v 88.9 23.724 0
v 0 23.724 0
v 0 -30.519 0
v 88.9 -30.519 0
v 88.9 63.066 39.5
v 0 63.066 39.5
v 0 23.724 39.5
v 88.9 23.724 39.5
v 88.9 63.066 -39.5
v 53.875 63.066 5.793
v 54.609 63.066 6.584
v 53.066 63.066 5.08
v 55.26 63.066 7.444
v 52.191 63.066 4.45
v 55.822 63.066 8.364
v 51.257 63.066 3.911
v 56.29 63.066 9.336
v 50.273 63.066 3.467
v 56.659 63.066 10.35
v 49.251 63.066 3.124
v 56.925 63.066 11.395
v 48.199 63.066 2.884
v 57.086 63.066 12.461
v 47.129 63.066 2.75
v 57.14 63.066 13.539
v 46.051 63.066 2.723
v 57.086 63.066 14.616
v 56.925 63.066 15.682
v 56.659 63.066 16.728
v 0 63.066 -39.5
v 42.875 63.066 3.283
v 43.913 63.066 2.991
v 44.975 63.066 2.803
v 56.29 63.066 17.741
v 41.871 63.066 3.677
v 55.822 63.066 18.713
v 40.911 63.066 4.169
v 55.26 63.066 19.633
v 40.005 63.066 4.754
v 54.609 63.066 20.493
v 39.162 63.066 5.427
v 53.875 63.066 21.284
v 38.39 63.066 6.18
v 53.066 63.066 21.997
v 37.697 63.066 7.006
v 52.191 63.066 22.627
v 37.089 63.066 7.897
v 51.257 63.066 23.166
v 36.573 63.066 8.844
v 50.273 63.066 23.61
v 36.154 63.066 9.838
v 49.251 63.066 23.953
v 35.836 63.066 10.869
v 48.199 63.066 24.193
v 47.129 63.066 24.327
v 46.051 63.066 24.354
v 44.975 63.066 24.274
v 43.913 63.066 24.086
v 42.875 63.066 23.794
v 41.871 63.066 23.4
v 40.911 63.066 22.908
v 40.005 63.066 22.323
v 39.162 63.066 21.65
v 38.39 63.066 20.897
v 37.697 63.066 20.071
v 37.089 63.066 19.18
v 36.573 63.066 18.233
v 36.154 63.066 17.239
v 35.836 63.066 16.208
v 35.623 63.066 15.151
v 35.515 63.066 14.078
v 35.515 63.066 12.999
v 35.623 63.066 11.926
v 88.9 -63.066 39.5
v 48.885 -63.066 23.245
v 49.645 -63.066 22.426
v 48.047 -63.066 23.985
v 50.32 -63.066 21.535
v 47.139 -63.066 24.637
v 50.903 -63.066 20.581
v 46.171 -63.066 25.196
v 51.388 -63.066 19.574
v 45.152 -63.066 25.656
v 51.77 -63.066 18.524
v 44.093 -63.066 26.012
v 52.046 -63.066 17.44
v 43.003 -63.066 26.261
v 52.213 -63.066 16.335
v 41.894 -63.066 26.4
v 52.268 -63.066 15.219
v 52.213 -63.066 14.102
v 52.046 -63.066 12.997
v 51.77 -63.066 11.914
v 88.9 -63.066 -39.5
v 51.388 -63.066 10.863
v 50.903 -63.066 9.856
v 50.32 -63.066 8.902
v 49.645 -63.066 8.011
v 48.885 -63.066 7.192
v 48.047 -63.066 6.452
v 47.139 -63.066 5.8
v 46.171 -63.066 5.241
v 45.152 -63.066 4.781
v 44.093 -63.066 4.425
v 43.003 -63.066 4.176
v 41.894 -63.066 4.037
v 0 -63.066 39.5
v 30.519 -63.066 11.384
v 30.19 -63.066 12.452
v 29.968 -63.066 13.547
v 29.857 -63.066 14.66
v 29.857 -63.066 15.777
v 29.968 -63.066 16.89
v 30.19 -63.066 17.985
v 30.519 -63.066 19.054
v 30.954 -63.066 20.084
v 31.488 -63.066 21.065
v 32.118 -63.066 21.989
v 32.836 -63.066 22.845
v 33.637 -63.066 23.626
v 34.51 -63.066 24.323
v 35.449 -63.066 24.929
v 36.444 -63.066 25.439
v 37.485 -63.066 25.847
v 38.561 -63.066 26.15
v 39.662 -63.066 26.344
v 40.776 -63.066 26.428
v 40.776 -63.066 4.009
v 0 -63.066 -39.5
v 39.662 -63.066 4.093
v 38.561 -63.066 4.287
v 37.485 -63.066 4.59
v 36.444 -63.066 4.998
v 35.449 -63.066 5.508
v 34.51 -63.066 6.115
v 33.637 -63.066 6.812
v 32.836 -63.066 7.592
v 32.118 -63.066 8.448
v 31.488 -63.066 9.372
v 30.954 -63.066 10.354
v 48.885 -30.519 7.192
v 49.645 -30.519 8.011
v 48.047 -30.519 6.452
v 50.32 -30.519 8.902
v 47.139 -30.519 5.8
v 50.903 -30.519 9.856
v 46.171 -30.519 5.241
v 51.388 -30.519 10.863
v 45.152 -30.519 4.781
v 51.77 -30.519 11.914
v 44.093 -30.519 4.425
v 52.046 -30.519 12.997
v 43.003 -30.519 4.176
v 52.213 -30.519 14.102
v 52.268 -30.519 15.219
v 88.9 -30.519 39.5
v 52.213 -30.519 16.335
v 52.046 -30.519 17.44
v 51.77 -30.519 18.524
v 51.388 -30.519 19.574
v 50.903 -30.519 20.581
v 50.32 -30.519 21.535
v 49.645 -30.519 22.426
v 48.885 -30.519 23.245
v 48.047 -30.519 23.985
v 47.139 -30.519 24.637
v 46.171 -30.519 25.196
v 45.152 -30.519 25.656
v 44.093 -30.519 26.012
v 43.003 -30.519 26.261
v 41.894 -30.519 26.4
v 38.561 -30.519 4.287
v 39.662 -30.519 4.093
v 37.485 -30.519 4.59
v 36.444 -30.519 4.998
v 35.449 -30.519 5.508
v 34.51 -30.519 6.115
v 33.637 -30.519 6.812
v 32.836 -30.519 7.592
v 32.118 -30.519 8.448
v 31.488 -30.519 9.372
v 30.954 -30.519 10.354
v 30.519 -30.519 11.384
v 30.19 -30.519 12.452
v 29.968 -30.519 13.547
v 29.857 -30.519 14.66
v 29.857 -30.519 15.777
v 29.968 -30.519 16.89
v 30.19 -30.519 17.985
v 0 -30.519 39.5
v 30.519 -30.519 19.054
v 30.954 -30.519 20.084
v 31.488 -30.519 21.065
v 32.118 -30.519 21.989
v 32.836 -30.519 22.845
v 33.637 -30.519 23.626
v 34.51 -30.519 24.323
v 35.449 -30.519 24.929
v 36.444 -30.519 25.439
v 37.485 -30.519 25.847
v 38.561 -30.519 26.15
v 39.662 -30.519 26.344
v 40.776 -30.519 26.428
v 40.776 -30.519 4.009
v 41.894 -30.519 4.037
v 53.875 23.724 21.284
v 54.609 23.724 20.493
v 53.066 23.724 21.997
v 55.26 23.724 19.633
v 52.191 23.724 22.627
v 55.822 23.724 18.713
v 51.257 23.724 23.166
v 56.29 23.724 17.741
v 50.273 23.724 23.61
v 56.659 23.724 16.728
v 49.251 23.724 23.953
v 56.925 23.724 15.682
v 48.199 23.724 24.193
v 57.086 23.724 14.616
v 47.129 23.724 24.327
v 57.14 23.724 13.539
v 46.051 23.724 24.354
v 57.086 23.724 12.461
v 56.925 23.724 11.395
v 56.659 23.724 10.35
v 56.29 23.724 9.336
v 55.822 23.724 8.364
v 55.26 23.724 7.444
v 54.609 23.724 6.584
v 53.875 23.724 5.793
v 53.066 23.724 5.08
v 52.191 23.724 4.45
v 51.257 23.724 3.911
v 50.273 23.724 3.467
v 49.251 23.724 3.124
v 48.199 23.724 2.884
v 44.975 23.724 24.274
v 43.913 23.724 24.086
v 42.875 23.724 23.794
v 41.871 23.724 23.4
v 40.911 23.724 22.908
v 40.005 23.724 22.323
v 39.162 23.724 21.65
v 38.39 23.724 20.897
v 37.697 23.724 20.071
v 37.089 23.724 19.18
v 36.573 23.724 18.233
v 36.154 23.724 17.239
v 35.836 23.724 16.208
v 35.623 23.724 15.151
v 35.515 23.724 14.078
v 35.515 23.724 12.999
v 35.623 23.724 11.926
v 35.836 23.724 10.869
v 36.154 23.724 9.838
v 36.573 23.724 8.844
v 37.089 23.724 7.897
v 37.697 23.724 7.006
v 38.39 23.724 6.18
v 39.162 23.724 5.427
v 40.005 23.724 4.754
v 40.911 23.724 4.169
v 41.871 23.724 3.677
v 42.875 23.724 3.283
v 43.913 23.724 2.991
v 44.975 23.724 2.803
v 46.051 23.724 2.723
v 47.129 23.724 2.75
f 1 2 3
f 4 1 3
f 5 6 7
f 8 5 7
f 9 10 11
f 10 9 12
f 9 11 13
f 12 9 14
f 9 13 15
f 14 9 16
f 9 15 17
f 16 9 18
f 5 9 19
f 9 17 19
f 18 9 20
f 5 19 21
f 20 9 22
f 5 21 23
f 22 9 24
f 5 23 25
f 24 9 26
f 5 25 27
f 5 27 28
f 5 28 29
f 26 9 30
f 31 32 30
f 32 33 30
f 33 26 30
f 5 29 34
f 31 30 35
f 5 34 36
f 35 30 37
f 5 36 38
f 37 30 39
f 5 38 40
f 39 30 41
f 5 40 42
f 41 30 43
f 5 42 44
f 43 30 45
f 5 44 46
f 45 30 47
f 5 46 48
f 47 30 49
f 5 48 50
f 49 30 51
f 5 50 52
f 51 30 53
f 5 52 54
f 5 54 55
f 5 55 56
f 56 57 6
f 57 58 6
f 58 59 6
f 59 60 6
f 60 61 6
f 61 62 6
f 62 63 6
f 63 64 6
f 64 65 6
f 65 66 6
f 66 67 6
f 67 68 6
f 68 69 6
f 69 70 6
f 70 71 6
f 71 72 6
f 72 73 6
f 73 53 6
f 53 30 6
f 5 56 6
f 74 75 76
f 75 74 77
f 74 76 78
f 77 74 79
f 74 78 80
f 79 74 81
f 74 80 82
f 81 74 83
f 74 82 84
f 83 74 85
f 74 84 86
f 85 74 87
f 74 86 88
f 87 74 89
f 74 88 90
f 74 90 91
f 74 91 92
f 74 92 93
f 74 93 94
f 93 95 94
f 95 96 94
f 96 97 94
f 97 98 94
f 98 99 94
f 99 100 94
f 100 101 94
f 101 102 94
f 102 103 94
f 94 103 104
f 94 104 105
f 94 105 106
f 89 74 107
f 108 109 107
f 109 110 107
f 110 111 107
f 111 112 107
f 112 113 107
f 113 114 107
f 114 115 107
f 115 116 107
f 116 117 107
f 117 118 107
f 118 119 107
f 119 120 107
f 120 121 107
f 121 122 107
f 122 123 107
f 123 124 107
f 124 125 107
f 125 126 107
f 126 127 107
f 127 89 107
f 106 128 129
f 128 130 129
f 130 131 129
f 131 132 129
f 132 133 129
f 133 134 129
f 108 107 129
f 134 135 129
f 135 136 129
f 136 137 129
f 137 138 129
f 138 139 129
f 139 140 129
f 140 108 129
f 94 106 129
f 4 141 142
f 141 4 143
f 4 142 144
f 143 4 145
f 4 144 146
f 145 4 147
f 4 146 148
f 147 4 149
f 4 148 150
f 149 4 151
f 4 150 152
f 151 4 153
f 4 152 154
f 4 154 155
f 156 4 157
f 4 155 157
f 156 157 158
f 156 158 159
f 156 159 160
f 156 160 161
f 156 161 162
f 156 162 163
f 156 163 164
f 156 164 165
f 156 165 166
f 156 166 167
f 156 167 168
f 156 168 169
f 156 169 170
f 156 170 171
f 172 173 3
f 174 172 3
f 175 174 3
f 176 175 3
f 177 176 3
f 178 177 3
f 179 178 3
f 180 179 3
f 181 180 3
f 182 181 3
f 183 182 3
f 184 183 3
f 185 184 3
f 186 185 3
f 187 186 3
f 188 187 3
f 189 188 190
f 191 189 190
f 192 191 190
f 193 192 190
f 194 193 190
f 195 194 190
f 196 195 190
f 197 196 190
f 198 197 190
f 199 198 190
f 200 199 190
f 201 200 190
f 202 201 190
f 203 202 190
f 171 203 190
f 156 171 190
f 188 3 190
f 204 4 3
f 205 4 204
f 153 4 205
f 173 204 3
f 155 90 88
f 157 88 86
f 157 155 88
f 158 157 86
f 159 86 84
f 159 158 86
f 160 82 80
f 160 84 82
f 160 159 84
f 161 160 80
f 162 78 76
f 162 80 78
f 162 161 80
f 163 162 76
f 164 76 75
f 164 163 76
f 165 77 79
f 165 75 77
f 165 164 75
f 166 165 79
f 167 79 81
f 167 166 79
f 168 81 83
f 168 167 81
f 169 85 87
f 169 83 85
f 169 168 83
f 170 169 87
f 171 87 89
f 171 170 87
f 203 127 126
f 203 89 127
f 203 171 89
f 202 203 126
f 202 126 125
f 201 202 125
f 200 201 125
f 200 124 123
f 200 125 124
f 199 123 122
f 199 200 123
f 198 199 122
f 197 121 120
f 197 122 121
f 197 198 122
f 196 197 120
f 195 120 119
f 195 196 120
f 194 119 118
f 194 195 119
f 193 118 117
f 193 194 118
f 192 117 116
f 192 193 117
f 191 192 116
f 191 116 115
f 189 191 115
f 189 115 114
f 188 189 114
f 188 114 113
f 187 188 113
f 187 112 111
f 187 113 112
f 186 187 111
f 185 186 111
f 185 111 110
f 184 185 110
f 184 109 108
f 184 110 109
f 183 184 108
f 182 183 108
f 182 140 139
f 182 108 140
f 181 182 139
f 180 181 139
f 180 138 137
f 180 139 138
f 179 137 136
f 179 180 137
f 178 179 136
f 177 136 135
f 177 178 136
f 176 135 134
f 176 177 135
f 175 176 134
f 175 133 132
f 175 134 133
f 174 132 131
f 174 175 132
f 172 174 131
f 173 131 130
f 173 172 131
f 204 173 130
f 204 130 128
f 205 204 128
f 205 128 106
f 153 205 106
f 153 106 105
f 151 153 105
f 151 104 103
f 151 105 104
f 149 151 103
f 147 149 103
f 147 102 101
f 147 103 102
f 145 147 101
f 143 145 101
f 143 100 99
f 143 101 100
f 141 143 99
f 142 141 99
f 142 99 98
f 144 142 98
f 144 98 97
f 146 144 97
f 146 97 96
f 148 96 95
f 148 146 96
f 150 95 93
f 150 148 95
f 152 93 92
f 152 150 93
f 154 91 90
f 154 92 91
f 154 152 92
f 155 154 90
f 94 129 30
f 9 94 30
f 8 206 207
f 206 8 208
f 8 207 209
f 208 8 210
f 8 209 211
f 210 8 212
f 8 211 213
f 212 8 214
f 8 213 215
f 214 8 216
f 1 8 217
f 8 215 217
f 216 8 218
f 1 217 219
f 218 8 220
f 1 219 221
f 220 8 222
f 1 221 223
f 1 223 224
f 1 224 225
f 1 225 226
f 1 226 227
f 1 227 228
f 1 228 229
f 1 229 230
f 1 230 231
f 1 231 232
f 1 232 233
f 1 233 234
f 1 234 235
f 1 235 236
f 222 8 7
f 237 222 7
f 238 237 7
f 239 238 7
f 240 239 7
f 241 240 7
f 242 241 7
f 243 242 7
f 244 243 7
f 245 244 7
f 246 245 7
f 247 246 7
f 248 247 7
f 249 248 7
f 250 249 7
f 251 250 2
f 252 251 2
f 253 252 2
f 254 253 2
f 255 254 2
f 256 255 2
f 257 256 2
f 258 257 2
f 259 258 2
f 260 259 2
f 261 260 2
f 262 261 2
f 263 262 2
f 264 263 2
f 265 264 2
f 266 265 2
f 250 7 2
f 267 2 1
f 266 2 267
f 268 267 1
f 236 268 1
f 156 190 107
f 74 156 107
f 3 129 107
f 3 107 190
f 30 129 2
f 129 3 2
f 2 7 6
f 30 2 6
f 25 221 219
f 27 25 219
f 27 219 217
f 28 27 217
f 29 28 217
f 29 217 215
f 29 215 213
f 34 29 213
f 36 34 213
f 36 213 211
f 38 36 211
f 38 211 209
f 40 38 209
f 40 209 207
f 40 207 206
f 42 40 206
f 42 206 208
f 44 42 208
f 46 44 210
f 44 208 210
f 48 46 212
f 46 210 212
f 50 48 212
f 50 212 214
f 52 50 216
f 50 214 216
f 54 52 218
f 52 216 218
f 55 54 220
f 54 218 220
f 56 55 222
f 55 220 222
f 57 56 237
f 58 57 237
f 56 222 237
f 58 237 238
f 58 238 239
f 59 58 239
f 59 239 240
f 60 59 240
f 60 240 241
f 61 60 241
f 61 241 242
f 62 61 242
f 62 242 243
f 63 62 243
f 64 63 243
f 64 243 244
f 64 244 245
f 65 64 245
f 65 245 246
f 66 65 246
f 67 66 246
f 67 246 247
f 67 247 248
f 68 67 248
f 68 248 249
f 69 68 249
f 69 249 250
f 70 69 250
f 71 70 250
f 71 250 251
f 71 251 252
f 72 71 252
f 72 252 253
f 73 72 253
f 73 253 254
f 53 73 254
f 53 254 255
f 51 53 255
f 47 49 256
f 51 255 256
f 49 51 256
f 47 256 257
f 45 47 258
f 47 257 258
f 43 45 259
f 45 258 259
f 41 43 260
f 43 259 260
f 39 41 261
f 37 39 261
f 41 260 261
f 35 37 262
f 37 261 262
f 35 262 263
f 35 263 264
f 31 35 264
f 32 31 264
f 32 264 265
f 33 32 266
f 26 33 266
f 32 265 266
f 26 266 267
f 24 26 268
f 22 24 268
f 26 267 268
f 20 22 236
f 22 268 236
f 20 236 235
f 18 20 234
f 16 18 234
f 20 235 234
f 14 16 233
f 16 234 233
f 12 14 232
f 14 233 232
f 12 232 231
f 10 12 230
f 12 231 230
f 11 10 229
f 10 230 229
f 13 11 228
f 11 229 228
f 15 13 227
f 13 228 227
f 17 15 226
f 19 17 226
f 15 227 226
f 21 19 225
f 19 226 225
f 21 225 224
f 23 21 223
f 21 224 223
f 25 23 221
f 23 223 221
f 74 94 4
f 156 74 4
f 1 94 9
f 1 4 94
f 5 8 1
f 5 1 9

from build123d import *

# Parameters (mm, degrees)
F1_DEPTH = 88.9
F2_R     = 11.212602
F3_DEPTH = 76.2
F4_R     = 10.819094
F5_DEPTH = 76.2


with BuildPart() as f1:
    # F0 (on Right) → F1 (new body)
    with BuildSketch(Plane.YZ):
        Polygon((63.066408, -39.499849), (63.066408, 39.499849), (23.723558, 39.499849), (23.723558, 0), (-30.519336, 0), (-30.519336, 39.499849), (-63.066408, 39.499849), (-63.066408, -39.499849), align=None)
    extrude(amount=F1_DEPTH)

    # F2 (on Front) → F3 (cut)
    with BuildSketch(Plane.XZ):
        with Locations((41.055754, 15.218571)):
            Circle(F2_R)
    extrude(amount=F3_DEPTH, mode=Mode.SUBTRACT)

    # F4 (on Front) → F5 (cut)
    with BuildSketch(Plane.XZ):
        with Locations((46.320774, 13.538517)):
            Circle(F4_R)
    extrude(amount=-F5_DEPTH, mode=Mode.SUBTRACT)


solid = f1.part
